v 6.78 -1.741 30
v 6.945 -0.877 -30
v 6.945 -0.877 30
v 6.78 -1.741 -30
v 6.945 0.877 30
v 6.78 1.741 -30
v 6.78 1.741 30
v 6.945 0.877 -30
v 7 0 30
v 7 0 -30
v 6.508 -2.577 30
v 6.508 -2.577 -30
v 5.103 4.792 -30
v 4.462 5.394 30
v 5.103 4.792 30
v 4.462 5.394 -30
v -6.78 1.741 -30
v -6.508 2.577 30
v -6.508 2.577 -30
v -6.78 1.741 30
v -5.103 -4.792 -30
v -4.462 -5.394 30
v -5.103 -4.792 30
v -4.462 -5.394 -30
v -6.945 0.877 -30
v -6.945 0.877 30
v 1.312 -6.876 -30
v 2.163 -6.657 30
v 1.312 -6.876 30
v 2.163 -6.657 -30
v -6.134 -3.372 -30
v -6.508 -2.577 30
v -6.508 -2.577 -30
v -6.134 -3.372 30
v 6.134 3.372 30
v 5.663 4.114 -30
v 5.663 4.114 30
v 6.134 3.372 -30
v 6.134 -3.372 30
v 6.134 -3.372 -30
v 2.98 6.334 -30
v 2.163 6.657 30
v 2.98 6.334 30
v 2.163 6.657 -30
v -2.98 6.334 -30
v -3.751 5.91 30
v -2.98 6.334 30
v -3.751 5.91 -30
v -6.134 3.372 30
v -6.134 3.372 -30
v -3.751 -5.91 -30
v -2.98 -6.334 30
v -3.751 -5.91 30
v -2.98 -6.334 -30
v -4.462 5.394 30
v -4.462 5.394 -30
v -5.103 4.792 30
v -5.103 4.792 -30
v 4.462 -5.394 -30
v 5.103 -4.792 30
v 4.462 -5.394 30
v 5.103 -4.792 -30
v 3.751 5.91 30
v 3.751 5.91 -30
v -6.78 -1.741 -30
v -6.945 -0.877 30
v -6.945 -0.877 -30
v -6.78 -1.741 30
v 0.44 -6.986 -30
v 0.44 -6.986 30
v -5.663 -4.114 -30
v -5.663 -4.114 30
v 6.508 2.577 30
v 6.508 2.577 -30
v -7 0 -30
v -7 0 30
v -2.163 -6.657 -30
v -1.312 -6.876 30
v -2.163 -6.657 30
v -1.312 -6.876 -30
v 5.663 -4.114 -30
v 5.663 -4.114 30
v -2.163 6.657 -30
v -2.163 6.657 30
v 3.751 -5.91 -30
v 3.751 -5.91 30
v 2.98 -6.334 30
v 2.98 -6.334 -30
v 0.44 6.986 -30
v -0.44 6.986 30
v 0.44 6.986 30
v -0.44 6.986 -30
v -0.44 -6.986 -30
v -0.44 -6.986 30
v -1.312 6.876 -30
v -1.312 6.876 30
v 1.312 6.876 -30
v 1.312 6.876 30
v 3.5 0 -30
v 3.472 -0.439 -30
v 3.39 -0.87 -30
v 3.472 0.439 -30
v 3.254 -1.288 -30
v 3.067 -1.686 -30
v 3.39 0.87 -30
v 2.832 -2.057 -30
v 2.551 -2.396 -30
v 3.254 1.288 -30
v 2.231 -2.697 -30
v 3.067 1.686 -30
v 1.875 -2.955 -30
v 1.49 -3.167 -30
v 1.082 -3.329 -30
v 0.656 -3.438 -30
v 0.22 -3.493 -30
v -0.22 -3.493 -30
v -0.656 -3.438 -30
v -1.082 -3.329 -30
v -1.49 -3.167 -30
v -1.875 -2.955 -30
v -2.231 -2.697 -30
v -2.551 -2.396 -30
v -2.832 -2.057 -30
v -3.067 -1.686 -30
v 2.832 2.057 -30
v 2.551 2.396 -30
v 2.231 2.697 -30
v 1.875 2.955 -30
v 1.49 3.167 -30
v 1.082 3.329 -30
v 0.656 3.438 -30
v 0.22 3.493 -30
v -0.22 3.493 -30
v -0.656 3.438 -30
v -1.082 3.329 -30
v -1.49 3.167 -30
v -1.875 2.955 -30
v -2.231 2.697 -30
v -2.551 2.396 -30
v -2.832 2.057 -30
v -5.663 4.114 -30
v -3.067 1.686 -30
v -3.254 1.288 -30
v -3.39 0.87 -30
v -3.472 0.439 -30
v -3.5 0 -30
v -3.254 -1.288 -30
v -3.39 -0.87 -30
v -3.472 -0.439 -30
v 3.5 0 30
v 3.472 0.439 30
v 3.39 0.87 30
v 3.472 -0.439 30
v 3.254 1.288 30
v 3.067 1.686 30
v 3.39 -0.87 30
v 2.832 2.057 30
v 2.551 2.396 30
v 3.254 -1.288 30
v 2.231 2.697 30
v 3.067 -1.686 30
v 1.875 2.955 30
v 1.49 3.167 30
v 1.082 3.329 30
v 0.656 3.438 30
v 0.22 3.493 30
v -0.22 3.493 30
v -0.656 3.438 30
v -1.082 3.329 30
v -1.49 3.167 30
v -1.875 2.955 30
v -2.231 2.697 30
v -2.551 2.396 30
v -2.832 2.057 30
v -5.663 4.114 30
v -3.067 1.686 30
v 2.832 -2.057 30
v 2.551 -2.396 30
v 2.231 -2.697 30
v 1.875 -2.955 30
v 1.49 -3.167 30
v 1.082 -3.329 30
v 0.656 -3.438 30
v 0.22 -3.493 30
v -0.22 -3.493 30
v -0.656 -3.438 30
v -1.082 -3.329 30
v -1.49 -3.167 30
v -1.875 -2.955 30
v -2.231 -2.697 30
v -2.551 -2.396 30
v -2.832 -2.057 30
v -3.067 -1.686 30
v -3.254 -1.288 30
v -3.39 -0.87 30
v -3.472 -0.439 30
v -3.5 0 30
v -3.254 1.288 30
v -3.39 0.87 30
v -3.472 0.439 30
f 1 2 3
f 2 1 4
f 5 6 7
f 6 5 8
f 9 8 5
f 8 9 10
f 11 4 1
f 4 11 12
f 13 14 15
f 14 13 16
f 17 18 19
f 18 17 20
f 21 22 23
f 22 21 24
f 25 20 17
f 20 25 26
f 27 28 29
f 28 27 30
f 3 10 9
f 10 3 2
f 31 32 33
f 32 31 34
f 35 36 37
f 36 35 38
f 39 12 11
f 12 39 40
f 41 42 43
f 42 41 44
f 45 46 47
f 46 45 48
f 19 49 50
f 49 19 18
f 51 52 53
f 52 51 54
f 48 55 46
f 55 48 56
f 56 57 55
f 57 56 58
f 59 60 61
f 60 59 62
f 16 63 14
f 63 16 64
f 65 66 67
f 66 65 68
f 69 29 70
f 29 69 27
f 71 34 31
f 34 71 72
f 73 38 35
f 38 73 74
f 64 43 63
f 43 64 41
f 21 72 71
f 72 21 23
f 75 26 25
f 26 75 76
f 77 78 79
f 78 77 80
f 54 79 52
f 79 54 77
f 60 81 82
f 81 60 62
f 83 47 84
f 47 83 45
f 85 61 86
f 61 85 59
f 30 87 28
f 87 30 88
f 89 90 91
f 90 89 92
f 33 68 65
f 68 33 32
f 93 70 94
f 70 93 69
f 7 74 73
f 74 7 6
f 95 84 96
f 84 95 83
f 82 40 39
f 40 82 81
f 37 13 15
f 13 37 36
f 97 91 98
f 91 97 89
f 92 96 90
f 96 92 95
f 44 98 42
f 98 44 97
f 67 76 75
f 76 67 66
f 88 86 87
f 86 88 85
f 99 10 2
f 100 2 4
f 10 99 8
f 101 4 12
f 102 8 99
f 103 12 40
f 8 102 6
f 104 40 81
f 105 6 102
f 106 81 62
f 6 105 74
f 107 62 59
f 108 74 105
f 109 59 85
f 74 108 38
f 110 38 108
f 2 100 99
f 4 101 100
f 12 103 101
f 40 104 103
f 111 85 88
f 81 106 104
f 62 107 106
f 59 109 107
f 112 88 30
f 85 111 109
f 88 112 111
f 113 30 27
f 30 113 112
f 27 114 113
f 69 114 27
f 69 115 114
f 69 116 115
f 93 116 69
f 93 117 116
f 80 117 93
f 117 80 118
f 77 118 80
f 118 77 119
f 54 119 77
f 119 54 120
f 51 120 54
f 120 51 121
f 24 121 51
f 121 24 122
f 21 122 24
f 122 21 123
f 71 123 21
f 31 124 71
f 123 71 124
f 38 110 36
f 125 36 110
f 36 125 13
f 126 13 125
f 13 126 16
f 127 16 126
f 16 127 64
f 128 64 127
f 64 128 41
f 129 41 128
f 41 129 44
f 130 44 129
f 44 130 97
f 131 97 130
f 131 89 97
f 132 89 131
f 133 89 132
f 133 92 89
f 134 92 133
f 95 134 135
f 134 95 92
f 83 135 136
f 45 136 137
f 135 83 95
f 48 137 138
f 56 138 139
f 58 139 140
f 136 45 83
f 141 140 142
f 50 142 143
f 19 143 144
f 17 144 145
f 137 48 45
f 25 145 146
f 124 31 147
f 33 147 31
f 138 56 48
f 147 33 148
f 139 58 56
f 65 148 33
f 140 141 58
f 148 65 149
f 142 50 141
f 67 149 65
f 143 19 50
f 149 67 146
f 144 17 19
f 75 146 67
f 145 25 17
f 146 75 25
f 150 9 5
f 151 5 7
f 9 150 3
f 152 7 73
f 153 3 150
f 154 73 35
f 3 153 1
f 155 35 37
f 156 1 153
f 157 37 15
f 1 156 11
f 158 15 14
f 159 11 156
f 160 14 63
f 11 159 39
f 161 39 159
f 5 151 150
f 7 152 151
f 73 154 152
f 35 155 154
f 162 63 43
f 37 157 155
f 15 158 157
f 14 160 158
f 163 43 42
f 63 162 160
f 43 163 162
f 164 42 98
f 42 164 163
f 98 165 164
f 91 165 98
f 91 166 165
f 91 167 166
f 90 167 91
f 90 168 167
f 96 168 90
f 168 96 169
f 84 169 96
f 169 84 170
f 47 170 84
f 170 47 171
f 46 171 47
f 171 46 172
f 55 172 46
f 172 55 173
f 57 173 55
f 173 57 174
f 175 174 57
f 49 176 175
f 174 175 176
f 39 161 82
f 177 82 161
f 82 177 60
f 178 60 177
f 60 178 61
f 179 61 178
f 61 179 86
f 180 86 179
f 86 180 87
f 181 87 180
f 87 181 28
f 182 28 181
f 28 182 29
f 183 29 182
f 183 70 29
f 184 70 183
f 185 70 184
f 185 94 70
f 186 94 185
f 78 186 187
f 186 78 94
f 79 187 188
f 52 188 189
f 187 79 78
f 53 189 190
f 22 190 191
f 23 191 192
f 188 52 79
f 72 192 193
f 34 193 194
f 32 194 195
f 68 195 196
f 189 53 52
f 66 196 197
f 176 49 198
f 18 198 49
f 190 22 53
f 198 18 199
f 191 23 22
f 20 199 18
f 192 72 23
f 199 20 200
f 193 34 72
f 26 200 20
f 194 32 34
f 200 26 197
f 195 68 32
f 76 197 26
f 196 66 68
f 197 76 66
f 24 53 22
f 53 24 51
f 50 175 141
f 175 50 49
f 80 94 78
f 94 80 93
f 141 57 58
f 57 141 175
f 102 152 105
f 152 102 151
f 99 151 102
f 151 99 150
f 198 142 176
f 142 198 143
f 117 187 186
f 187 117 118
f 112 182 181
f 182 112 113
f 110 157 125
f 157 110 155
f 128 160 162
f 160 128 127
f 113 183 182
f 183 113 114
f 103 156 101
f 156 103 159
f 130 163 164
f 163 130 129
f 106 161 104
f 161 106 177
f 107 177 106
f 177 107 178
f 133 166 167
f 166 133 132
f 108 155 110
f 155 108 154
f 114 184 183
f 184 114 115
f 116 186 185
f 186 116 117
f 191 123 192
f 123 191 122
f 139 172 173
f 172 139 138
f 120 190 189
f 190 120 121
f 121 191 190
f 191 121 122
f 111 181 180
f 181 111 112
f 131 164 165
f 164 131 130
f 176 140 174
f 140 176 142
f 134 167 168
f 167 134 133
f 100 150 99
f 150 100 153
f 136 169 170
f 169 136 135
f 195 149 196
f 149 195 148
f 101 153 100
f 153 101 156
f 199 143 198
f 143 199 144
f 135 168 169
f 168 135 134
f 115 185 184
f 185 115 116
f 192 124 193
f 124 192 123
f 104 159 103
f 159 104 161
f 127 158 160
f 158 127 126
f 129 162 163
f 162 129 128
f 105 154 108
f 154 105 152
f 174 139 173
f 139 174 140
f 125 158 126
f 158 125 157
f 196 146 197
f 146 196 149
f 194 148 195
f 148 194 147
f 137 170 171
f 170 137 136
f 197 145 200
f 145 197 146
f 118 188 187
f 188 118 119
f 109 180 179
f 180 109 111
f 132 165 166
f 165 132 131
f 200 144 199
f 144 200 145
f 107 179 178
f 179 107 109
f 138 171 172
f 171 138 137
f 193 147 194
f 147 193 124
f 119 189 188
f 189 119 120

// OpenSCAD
$fn = 50;


difference() {
	union() {
		translate(v = [0, 0, -30.0000000000]) {
			cylinder(h = 60, r = 7.0000000000);
		}
	}
	union() {
		translate(v = [0, 0, -100.0000000000]) {
			cylinder(h = 200, r = 3.5000000000);
		}
	}
}
